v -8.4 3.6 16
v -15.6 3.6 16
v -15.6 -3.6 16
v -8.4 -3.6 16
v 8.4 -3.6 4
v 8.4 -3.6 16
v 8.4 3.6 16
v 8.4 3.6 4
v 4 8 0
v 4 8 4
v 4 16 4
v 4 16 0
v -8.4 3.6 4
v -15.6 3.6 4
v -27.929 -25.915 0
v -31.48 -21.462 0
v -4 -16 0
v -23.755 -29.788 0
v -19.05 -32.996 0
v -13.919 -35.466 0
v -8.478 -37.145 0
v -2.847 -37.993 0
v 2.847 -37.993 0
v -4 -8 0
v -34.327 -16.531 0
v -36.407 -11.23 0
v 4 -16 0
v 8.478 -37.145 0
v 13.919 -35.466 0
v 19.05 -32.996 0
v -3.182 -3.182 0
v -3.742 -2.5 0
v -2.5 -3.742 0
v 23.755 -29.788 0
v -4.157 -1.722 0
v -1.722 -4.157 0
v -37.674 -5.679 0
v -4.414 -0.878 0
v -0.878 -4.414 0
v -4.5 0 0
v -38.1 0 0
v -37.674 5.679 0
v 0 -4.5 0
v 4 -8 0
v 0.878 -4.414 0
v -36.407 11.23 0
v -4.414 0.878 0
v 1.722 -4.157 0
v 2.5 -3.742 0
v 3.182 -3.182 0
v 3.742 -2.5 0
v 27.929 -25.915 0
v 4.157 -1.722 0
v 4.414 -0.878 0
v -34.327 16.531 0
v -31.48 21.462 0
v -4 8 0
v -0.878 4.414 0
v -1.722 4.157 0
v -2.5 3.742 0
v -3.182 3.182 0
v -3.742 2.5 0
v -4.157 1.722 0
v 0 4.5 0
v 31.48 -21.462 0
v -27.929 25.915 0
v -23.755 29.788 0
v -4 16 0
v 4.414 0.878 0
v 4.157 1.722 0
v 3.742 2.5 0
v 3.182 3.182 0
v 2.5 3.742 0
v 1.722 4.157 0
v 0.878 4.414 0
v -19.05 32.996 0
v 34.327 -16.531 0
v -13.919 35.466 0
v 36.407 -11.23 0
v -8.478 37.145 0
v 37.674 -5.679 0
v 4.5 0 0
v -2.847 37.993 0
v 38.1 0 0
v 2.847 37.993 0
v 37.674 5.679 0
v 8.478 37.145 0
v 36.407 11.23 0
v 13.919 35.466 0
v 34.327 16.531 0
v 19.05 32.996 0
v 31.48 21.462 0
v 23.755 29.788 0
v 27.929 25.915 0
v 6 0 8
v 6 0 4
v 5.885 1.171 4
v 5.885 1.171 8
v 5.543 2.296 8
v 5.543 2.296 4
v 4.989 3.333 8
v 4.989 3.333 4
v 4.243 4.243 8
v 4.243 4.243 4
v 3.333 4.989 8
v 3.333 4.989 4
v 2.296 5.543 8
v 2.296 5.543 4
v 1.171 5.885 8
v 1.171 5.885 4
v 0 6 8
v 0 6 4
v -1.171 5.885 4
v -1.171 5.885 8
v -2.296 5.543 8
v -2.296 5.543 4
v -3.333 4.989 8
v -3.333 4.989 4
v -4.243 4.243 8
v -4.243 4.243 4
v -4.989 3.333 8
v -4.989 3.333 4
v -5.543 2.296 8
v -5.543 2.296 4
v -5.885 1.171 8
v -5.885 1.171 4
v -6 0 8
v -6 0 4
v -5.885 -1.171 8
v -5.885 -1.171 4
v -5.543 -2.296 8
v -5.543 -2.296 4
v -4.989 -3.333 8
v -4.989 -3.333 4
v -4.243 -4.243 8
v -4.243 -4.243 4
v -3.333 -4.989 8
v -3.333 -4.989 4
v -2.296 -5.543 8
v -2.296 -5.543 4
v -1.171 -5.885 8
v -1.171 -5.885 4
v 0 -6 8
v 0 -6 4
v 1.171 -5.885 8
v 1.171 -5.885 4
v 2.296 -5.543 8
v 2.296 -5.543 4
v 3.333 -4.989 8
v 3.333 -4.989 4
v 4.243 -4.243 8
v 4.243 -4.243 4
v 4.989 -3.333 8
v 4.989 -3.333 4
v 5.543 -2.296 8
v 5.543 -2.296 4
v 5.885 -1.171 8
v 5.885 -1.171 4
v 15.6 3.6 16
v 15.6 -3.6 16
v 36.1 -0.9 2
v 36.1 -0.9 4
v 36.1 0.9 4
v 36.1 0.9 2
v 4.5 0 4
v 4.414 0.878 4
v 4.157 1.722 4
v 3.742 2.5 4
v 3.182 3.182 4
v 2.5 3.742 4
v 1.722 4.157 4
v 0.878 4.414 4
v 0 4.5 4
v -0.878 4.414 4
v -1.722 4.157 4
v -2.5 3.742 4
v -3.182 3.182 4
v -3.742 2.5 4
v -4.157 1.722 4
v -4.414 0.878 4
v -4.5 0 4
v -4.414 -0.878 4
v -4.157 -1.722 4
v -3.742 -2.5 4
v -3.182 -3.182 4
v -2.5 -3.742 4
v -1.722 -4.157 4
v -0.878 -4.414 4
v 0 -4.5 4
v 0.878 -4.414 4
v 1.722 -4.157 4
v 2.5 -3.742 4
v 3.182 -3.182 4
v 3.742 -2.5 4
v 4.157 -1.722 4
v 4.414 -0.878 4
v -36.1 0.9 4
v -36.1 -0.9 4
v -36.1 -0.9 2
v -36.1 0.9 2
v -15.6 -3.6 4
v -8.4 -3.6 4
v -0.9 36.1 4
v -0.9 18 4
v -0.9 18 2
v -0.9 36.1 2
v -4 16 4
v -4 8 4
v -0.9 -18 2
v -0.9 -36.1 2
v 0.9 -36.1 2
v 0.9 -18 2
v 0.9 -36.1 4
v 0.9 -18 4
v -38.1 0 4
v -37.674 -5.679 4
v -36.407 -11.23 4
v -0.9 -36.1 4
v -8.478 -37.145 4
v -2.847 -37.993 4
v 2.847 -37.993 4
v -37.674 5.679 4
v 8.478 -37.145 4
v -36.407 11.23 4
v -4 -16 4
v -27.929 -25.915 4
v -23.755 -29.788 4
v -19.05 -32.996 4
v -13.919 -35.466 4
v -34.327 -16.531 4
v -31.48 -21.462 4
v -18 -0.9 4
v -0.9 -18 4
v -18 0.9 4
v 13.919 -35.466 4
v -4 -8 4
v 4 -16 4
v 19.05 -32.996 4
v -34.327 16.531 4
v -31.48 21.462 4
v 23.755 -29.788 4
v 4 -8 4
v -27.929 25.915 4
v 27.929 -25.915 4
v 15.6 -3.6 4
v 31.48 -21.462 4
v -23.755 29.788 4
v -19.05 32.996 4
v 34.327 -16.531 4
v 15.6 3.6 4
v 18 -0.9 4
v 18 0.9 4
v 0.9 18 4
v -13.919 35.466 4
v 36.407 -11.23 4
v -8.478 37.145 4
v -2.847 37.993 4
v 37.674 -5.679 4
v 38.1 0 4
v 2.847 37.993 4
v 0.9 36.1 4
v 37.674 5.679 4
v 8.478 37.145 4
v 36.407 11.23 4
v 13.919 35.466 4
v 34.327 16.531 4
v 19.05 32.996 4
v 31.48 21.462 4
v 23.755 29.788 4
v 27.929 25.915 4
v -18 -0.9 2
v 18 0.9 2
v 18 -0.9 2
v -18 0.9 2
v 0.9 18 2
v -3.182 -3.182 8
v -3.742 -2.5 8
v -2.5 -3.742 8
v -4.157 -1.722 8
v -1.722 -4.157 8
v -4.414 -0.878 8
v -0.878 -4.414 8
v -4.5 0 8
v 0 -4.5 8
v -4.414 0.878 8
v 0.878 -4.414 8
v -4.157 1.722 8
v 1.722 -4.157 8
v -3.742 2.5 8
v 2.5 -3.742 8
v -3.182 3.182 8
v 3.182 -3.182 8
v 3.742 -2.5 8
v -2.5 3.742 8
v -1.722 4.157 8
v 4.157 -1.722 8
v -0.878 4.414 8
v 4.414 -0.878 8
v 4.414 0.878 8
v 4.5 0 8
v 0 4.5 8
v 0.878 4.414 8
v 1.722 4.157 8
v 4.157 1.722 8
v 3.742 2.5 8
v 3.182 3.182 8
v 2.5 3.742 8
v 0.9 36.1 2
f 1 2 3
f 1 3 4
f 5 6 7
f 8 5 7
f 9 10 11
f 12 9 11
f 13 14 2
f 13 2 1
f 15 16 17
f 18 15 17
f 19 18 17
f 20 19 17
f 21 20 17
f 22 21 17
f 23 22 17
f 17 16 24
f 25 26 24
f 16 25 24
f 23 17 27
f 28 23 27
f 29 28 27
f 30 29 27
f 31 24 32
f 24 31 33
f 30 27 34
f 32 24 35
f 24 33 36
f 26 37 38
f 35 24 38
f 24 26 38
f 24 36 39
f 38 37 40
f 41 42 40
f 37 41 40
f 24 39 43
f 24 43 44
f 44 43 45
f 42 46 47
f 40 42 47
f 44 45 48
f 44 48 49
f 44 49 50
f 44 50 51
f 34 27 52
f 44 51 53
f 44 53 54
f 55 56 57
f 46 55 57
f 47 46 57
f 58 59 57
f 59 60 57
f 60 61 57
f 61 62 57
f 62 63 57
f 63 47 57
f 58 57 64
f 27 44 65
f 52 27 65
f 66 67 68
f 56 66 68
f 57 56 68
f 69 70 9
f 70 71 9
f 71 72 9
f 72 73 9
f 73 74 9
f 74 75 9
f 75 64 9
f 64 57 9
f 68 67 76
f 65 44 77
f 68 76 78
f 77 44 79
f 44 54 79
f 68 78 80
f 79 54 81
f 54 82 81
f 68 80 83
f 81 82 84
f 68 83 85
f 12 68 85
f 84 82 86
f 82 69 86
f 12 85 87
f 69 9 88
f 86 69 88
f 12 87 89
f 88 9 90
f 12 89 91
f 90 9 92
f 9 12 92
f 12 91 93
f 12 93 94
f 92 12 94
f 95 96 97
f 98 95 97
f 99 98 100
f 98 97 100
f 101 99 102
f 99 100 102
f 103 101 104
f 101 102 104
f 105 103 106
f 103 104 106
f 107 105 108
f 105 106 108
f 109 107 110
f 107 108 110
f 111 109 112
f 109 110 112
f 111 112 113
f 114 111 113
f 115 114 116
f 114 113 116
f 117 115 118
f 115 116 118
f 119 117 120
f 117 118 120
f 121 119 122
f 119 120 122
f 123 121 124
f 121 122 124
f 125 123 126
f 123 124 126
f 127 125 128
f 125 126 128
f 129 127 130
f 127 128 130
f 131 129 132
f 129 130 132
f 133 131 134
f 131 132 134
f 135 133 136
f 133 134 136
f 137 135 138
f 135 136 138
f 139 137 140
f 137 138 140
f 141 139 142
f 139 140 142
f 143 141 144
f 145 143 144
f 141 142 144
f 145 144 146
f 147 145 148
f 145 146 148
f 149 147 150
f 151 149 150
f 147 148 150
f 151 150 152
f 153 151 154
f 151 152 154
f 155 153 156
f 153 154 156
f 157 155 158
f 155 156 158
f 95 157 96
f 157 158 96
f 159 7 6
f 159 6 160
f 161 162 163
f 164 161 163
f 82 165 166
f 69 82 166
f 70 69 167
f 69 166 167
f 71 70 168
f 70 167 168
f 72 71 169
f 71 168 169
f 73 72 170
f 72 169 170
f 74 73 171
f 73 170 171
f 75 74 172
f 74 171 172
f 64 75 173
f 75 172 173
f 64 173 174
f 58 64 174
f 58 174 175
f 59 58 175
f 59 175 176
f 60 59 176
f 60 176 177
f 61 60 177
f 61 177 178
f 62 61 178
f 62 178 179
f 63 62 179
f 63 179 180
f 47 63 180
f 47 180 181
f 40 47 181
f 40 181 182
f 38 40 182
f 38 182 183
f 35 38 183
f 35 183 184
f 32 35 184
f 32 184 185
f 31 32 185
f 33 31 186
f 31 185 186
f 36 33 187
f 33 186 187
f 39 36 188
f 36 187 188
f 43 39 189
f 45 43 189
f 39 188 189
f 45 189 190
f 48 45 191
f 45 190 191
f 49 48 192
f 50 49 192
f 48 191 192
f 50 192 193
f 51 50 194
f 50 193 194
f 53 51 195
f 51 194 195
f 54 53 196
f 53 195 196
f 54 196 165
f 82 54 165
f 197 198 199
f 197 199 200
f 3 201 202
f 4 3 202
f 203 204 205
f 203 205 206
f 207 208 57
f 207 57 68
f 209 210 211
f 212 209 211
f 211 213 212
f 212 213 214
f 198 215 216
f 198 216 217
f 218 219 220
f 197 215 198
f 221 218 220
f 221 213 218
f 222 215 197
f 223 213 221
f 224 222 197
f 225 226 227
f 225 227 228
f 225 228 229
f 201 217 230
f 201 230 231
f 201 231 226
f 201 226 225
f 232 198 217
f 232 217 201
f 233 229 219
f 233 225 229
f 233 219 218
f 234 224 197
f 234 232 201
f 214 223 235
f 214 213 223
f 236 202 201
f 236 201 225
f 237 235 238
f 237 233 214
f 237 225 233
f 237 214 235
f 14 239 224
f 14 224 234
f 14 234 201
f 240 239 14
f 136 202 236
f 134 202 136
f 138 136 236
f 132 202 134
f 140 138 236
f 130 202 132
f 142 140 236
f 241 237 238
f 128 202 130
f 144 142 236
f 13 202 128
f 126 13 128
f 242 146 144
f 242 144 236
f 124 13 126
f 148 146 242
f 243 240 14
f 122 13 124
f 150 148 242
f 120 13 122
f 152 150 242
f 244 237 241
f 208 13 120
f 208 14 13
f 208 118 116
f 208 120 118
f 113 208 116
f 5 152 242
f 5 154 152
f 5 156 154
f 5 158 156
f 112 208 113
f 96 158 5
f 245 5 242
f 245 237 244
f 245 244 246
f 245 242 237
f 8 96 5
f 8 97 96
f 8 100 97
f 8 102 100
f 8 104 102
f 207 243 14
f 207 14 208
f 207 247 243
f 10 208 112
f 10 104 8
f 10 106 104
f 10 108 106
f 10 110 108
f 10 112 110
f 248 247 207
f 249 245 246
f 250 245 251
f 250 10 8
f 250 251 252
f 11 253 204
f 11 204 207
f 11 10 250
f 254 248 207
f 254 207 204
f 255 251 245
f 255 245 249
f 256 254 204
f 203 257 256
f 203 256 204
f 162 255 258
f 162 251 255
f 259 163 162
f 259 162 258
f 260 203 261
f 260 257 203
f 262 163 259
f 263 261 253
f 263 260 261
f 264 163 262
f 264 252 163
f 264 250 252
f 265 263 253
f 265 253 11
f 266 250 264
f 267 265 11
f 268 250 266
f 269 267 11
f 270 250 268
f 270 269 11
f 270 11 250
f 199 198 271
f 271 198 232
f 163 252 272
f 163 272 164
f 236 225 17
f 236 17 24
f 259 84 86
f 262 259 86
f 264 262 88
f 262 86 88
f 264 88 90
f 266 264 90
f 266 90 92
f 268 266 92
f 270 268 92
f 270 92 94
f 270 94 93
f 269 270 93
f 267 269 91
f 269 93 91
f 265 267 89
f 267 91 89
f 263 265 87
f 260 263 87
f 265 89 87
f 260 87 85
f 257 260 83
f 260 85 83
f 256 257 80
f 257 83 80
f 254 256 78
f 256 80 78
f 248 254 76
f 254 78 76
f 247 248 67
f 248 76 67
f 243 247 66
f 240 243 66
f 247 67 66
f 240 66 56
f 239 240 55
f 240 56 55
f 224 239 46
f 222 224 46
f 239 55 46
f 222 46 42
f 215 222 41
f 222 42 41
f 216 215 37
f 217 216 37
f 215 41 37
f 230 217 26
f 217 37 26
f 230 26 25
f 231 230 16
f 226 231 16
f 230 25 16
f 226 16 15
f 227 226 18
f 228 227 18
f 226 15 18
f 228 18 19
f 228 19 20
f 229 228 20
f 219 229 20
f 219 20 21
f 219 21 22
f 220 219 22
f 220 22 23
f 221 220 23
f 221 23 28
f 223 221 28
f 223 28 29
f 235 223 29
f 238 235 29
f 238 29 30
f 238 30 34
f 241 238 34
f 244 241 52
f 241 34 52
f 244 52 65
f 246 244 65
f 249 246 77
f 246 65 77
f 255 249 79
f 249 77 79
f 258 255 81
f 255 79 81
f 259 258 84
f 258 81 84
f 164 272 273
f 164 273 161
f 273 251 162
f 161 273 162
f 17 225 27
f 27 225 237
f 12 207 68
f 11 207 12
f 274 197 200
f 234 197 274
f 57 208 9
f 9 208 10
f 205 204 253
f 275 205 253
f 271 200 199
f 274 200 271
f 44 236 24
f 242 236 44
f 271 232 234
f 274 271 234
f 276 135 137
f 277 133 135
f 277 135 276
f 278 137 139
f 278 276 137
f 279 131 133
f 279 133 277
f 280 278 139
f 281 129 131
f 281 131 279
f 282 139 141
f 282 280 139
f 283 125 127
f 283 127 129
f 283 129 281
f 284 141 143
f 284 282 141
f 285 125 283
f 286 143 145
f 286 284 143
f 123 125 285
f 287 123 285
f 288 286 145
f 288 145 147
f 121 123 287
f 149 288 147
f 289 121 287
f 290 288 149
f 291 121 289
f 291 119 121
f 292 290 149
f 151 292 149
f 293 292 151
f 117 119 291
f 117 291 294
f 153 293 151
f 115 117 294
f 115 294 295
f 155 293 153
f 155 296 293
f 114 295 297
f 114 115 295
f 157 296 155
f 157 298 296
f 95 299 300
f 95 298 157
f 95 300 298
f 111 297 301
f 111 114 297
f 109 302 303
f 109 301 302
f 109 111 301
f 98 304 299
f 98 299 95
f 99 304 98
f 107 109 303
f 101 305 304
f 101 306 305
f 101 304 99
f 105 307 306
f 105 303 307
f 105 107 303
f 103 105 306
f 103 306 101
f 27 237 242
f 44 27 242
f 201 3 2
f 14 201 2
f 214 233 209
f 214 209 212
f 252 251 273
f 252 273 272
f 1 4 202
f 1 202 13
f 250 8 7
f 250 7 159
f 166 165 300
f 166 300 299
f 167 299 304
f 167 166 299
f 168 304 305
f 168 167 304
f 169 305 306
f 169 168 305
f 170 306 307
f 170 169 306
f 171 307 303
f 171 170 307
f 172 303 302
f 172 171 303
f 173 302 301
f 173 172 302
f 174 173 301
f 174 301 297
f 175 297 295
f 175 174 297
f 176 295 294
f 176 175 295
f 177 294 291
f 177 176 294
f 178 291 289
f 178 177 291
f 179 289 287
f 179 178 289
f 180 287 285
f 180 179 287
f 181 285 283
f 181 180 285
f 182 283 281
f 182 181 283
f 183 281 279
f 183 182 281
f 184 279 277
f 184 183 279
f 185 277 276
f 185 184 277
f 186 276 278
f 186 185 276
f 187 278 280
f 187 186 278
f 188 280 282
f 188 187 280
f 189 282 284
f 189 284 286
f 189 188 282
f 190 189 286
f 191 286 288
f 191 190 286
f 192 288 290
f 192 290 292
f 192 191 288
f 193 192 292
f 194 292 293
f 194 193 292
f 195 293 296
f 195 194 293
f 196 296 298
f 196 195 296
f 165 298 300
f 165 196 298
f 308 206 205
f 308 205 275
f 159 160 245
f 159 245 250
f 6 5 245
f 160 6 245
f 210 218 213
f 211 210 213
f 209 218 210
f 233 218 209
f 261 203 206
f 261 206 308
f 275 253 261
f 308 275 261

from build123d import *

# Parameters (mm, degrees)
F0_R     = 38.1
F1_DEPTH = 4
F2_R     = 4.5
F2_W     = 8
F2_H     = 8
F3_DEPTH = 4.001
F2_W_2   = 7.2
F2_H_2   = 7.2
F4_DEPTH = 12
F2_R_2   = 6
F5_DEPTH = 4
F6_W     = 1.8
F6_H     = 18.1
F6_W_2   = 18.1
F6_H_2   = 1.8
F7_DEPTH = 2


with BuildPart() as f1:
    # F0 (on Top) → F1 (new body)
    with BuildSketch(Plane.XY):
        Circle(F0_R)
    extrude(amount=F1_DEPTH)

    # F2 (on face) → F3 (cut, through all)
    with BuildSketch(Plane.XY.offset(4)):
        Circle(F2_R)
        with Locations((0, 12)):
            Rectangle(F2_W, F2_H)
        with Locations((0, -12)):
            Rectangle(F2_W, F2_H)
    extrude(amount=-F3_DEPTH, mode=Mode.SUBTRACT)

    # F2 (on face) → F4 (join)
    with BuildSketch(Plane.XY.offset(4)):
        with Locations((12, 0)):
            Rectangle(F2_W_2, F2_H_2)
        with Locations((-12, 0)):
            Rectangle(F2_W_2, F2_H_2)
    extrude(amount=F4_DEPTH)

    # F2 (on face) → F5 (join)
    with BuildSketch(Plane.XY.offset(4)):
        Circle(F2_R_2)
        Circle(F2_R, mode=Mode.SUBTRACT)
    extrude(amount=F5_DEPTH)

    # F6 (on face) → F7 (cut)
    with BuildSketch(Plane.XY.offset(4)):
        with Locations((0, 27.05)):
            Rectangle(F6_W, F6_H)
        with Locations((-27.05, 0)):
            Rectangle(F6_W_2, F6_H_2)
        with Locations((0, -27.05)):
            Rectangle(F6_W, F6_H)
        with Locations((27.05, 0)):
            Rectangle(F6_W_2, F6_H_2)
    extrude(amount=-F7_DEPTH, mode=Mode.SUBTRACT)


solid = f1.part
